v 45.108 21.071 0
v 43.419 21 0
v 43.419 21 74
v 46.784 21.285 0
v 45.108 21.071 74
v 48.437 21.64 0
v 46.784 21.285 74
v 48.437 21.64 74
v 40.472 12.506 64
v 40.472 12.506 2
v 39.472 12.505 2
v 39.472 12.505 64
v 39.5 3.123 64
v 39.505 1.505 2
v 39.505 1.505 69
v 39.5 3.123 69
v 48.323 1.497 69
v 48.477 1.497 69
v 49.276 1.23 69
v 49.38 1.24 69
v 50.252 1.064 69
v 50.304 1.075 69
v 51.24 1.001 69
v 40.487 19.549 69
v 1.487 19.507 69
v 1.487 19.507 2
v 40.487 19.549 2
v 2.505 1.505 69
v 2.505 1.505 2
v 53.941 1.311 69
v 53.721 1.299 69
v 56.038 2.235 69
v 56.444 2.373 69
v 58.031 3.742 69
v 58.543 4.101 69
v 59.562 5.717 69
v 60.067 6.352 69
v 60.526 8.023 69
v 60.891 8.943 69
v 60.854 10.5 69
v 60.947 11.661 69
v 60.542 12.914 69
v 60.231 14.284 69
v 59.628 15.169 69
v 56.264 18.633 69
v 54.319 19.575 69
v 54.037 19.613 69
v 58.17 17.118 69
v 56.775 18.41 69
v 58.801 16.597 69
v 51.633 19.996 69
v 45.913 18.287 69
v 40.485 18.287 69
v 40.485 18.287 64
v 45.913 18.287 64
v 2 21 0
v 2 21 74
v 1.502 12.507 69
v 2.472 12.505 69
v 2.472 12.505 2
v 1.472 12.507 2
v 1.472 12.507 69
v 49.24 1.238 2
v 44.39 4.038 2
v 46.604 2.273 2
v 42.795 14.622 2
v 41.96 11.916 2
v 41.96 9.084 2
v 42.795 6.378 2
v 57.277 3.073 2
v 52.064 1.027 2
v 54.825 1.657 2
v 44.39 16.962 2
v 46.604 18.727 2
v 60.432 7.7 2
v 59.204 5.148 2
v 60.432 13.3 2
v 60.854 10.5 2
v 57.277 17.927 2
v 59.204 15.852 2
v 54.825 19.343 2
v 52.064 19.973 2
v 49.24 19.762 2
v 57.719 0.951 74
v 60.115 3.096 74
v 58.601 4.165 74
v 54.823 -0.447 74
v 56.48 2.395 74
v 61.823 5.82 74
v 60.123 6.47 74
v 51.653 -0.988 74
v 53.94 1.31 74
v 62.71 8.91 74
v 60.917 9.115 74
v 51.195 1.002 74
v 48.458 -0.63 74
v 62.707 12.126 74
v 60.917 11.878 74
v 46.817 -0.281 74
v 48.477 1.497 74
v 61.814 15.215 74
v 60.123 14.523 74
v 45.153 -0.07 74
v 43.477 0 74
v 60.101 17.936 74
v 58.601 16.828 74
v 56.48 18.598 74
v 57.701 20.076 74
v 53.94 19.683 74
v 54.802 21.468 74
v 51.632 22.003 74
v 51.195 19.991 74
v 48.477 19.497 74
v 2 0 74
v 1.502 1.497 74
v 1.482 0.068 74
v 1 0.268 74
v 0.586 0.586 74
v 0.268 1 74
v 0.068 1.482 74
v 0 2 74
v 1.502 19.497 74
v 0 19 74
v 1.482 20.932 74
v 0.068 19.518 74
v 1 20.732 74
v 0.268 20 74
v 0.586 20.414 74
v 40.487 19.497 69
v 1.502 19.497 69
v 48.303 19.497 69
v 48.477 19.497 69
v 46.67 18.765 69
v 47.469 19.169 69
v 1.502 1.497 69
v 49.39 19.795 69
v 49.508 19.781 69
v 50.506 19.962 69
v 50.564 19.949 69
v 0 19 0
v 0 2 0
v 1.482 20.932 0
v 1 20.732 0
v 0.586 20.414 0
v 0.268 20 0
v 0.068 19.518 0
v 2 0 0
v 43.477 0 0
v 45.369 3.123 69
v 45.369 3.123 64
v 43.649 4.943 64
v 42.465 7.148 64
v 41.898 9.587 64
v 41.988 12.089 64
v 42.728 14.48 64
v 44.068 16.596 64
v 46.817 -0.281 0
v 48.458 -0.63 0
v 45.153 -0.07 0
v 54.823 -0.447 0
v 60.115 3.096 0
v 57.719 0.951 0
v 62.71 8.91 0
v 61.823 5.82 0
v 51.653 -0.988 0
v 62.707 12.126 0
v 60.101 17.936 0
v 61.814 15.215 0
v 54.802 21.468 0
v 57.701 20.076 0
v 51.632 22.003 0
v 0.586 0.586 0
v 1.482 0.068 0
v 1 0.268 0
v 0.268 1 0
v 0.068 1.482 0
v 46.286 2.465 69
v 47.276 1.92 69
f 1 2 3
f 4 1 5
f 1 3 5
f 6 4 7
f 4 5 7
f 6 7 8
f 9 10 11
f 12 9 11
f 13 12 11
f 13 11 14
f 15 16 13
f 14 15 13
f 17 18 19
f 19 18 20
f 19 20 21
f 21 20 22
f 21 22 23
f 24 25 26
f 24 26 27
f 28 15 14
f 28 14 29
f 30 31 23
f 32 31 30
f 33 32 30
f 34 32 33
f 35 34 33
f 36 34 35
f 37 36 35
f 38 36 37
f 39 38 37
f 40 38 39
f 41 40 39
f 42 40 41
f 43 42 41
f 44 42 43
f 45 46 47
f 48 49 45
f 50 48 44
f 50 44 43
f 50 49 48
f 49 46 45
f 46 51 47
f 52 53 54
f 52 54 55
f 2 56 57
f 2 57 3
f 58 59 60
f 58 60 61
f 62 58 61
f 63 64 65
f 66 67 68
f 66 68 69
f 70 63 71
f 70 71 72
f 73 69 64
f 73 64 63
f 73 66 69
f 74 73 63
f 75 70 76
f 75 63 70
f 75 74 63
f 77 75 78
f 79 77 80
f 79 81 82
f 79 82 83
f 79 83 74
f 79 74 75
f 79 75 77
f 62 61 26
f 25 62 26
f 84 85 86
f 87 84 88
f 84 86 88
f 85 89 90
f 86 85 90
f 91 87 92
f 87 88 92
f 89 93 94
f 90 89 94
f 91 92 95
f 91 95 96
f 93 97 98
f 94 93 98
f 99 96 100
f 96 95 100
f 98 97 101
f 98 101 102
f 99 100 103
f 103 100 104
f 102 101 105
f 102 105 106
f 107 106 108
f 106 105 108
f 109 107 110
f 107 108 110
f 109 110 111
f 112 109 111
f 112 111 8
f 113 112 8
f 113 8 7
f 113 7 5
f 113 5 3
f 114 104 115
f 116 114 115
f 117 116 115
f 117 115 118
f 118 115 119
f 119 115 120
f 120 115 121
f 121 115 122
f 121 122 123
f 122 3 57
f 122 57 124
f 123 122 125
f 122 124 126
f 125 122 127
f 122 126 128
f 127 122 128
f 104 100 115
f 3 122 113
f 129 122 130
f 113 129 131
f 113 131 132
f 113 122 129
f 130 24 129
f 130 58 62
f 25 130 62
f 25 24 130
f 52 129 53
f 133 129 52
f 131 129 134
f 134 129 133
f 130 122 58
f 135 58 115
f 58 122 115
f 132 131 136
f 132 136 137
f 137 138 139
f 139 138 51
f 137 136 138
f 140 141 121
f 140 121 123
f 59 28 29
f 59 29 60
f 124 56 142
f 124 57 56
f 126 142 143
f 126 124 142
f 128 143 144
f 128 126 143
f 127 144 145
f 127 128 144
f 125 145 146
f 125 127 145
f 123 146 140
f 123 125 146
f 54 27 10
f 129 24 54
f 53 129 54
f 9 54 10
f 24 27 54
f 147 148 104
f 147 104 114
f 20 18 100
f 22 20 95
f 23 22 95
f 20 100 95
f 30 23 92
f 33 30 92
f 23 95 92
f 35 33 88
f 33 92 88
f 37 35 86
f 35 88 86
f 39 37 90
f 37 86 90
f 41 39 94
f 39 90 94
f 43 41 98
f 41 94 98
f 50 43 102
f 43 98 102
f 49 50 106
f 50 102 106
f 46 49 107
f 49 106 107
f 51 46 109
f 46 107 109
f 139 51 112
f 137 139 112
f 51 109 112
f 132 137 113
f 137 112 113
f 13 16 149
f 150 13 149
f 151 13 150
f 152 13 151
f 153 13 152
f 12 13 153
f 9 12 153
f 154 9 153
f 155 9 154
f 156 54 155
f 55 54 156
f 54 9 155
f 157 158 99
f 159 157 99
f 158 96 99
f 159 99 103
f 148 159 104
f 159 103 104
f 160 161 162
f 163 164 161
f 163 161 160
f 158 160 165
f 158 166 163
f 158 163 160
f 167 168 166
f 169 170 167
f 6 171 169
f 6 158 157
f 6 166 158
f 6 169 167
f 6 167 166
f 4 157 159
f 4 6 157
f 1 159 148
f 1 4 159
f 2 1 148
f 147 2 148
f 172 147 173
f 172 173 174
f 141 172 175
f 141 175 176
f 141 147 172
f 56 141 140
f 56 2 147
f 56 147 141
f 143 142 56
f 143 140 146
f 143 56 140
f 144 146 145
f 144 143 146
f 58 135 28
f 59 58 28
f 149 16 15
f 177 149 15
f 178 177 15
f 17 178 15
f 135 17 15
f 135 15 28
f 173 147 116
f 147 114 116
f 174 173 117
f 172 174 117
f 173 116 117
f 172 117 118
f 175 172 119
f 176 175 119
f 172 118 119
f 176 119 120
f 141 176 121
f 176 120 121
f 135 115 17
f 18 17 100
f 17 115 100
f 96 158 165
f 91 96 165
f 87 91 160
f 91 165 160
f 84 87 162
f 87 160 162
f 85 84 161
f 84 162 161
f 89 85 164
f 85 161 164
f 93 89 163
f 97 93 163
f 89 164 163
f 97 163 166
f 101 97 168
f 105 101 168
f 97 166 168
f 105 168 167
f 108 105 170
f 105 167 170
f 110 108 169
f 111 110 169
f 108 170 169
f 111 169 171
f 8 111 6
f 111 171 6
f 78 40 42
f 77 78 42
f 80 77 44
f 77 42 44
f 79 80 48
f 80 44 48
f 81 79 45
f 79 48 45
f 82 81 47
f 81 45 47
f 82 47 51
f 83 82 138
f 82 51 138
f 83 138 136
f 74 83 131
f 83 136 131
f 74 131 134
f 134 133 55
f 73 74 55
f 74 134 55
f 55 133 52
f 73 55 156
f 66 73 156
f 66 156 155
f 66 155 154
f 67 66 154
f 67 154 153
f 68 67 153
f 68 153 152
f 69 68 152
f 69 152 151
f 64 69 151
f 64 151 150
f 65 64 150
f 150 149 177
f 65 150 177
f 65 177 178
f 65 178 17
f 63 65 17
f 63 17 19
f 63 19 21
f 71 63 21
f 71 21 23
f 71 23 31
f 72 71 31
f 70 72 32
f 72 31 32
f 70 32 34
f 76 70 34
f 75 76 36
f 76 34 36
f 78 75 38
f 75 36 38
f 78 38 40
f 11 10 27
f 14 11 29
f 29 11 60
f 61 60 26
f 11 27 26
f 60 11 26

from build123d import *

# Parameters (mm, degrees)
PAD_DEPTH       = 74
POCKET_DEPTH    = 5
SKETCH001_R     = 9.5
POCKET001_DEPTH = 67
FILLET_R        = 20
FILLET001_R     = 2
FILLET002_R     = 20
FILLET003_R     = 2
SKETCH014_W     = 7.96524
SKETCH014_H     = 15.164599
POCKET005_DEPTH = 5


with BuildPart() as part:
    # Sketch002 → Pad (new body)
    with BuildSketch(Plane.XY):
        with BuildLine():
            Line((0, 21), (46.6148, 21))
            ThreePointArc((46.64809, 0), (62.821811, 10.525666), (46.6148, 21))
            Line((46.64809, 0), (0, 0))
            Line((0, 0), (0, 21))
        make_face()
    extrude(amount=PAD_DEPTH)

    # Sketch → Pocket (cut)
    with BuildSketch(Plane.XY.offset(74)):
        with BuildLine():
            Line((1.502029, 1.496604), (48.477029, 1.496604))
            ThreePointArc((48.477029, 1.496604), (61.01841, 10.496604), (48.477029, 19.496604))
            Line((1.502029, 19.496604), (48.477029, 19.496604))
            Line((1.502029, 19.496604), (1.502029, 1.496604))
        make_face()
    extrude(amount=-POCKET_DEPTH, mode=Mode.SUBTRACT)

    # Sketch001 → Pocket001 (cut)
    with BuildSketch(Plane.XY.offset(69)):
        with Locations((51.354257, 10.5)):
            Circle(SKETCH001_R)
        Polygon((1.487366, 19.5069), (40.487343, 19.54915), (40.471612, 12.505767), (39.471612, 12.504684), (39.504804, 1.504734), (2.504921, 1.504734), (2.471729, 12.504684), (1.471732, 12.506917), align=None)
    extrude(amount=-POCKET001_DEPTH, mode=Mode.SUBTRACT)

    # Fillet
    fillet_edges = [part.edges().sort_by_distance(p)[0] for p in [
        (46.6148, 21, 37),
    ]]
    fillet(fillet_edges, radius=FILLET_R)

    # Fillet001
    fillet001_edges = [part.edges().sort_by_distance(p)[0] for p in [
        (0, 21, 37),
    ]]
    fillet(fillet001_edges, radius=FILLET001_R)

    # Fillet002
    fillet002_edges = [part.edges().sort_by_distance(p)[0] for p in [
        (46.64809, 0, 37),
    ]]
    fillet(fillet002_edges, radius=FILLET002_R)

    # Fillet003
    fillet003_edges = [part.edges().sort_by_distance(p)[0] for p in [
        (0, 0, 37),
    ]]
    fillet(fillet003_edges, radius=FILLET003_R)

    # Sketch014 → Pocket005 (cut)
    with BuildSketch(Plane.XY.offset(69)):
        with Locations((42.834709, 10.705082)):
            Rectangle(SKETCH014_W, SKETCH014_H)
    extrude(amount=-POCKET005_DEPTH, mode=Mode.SUBTRACT)


solid = part.part
